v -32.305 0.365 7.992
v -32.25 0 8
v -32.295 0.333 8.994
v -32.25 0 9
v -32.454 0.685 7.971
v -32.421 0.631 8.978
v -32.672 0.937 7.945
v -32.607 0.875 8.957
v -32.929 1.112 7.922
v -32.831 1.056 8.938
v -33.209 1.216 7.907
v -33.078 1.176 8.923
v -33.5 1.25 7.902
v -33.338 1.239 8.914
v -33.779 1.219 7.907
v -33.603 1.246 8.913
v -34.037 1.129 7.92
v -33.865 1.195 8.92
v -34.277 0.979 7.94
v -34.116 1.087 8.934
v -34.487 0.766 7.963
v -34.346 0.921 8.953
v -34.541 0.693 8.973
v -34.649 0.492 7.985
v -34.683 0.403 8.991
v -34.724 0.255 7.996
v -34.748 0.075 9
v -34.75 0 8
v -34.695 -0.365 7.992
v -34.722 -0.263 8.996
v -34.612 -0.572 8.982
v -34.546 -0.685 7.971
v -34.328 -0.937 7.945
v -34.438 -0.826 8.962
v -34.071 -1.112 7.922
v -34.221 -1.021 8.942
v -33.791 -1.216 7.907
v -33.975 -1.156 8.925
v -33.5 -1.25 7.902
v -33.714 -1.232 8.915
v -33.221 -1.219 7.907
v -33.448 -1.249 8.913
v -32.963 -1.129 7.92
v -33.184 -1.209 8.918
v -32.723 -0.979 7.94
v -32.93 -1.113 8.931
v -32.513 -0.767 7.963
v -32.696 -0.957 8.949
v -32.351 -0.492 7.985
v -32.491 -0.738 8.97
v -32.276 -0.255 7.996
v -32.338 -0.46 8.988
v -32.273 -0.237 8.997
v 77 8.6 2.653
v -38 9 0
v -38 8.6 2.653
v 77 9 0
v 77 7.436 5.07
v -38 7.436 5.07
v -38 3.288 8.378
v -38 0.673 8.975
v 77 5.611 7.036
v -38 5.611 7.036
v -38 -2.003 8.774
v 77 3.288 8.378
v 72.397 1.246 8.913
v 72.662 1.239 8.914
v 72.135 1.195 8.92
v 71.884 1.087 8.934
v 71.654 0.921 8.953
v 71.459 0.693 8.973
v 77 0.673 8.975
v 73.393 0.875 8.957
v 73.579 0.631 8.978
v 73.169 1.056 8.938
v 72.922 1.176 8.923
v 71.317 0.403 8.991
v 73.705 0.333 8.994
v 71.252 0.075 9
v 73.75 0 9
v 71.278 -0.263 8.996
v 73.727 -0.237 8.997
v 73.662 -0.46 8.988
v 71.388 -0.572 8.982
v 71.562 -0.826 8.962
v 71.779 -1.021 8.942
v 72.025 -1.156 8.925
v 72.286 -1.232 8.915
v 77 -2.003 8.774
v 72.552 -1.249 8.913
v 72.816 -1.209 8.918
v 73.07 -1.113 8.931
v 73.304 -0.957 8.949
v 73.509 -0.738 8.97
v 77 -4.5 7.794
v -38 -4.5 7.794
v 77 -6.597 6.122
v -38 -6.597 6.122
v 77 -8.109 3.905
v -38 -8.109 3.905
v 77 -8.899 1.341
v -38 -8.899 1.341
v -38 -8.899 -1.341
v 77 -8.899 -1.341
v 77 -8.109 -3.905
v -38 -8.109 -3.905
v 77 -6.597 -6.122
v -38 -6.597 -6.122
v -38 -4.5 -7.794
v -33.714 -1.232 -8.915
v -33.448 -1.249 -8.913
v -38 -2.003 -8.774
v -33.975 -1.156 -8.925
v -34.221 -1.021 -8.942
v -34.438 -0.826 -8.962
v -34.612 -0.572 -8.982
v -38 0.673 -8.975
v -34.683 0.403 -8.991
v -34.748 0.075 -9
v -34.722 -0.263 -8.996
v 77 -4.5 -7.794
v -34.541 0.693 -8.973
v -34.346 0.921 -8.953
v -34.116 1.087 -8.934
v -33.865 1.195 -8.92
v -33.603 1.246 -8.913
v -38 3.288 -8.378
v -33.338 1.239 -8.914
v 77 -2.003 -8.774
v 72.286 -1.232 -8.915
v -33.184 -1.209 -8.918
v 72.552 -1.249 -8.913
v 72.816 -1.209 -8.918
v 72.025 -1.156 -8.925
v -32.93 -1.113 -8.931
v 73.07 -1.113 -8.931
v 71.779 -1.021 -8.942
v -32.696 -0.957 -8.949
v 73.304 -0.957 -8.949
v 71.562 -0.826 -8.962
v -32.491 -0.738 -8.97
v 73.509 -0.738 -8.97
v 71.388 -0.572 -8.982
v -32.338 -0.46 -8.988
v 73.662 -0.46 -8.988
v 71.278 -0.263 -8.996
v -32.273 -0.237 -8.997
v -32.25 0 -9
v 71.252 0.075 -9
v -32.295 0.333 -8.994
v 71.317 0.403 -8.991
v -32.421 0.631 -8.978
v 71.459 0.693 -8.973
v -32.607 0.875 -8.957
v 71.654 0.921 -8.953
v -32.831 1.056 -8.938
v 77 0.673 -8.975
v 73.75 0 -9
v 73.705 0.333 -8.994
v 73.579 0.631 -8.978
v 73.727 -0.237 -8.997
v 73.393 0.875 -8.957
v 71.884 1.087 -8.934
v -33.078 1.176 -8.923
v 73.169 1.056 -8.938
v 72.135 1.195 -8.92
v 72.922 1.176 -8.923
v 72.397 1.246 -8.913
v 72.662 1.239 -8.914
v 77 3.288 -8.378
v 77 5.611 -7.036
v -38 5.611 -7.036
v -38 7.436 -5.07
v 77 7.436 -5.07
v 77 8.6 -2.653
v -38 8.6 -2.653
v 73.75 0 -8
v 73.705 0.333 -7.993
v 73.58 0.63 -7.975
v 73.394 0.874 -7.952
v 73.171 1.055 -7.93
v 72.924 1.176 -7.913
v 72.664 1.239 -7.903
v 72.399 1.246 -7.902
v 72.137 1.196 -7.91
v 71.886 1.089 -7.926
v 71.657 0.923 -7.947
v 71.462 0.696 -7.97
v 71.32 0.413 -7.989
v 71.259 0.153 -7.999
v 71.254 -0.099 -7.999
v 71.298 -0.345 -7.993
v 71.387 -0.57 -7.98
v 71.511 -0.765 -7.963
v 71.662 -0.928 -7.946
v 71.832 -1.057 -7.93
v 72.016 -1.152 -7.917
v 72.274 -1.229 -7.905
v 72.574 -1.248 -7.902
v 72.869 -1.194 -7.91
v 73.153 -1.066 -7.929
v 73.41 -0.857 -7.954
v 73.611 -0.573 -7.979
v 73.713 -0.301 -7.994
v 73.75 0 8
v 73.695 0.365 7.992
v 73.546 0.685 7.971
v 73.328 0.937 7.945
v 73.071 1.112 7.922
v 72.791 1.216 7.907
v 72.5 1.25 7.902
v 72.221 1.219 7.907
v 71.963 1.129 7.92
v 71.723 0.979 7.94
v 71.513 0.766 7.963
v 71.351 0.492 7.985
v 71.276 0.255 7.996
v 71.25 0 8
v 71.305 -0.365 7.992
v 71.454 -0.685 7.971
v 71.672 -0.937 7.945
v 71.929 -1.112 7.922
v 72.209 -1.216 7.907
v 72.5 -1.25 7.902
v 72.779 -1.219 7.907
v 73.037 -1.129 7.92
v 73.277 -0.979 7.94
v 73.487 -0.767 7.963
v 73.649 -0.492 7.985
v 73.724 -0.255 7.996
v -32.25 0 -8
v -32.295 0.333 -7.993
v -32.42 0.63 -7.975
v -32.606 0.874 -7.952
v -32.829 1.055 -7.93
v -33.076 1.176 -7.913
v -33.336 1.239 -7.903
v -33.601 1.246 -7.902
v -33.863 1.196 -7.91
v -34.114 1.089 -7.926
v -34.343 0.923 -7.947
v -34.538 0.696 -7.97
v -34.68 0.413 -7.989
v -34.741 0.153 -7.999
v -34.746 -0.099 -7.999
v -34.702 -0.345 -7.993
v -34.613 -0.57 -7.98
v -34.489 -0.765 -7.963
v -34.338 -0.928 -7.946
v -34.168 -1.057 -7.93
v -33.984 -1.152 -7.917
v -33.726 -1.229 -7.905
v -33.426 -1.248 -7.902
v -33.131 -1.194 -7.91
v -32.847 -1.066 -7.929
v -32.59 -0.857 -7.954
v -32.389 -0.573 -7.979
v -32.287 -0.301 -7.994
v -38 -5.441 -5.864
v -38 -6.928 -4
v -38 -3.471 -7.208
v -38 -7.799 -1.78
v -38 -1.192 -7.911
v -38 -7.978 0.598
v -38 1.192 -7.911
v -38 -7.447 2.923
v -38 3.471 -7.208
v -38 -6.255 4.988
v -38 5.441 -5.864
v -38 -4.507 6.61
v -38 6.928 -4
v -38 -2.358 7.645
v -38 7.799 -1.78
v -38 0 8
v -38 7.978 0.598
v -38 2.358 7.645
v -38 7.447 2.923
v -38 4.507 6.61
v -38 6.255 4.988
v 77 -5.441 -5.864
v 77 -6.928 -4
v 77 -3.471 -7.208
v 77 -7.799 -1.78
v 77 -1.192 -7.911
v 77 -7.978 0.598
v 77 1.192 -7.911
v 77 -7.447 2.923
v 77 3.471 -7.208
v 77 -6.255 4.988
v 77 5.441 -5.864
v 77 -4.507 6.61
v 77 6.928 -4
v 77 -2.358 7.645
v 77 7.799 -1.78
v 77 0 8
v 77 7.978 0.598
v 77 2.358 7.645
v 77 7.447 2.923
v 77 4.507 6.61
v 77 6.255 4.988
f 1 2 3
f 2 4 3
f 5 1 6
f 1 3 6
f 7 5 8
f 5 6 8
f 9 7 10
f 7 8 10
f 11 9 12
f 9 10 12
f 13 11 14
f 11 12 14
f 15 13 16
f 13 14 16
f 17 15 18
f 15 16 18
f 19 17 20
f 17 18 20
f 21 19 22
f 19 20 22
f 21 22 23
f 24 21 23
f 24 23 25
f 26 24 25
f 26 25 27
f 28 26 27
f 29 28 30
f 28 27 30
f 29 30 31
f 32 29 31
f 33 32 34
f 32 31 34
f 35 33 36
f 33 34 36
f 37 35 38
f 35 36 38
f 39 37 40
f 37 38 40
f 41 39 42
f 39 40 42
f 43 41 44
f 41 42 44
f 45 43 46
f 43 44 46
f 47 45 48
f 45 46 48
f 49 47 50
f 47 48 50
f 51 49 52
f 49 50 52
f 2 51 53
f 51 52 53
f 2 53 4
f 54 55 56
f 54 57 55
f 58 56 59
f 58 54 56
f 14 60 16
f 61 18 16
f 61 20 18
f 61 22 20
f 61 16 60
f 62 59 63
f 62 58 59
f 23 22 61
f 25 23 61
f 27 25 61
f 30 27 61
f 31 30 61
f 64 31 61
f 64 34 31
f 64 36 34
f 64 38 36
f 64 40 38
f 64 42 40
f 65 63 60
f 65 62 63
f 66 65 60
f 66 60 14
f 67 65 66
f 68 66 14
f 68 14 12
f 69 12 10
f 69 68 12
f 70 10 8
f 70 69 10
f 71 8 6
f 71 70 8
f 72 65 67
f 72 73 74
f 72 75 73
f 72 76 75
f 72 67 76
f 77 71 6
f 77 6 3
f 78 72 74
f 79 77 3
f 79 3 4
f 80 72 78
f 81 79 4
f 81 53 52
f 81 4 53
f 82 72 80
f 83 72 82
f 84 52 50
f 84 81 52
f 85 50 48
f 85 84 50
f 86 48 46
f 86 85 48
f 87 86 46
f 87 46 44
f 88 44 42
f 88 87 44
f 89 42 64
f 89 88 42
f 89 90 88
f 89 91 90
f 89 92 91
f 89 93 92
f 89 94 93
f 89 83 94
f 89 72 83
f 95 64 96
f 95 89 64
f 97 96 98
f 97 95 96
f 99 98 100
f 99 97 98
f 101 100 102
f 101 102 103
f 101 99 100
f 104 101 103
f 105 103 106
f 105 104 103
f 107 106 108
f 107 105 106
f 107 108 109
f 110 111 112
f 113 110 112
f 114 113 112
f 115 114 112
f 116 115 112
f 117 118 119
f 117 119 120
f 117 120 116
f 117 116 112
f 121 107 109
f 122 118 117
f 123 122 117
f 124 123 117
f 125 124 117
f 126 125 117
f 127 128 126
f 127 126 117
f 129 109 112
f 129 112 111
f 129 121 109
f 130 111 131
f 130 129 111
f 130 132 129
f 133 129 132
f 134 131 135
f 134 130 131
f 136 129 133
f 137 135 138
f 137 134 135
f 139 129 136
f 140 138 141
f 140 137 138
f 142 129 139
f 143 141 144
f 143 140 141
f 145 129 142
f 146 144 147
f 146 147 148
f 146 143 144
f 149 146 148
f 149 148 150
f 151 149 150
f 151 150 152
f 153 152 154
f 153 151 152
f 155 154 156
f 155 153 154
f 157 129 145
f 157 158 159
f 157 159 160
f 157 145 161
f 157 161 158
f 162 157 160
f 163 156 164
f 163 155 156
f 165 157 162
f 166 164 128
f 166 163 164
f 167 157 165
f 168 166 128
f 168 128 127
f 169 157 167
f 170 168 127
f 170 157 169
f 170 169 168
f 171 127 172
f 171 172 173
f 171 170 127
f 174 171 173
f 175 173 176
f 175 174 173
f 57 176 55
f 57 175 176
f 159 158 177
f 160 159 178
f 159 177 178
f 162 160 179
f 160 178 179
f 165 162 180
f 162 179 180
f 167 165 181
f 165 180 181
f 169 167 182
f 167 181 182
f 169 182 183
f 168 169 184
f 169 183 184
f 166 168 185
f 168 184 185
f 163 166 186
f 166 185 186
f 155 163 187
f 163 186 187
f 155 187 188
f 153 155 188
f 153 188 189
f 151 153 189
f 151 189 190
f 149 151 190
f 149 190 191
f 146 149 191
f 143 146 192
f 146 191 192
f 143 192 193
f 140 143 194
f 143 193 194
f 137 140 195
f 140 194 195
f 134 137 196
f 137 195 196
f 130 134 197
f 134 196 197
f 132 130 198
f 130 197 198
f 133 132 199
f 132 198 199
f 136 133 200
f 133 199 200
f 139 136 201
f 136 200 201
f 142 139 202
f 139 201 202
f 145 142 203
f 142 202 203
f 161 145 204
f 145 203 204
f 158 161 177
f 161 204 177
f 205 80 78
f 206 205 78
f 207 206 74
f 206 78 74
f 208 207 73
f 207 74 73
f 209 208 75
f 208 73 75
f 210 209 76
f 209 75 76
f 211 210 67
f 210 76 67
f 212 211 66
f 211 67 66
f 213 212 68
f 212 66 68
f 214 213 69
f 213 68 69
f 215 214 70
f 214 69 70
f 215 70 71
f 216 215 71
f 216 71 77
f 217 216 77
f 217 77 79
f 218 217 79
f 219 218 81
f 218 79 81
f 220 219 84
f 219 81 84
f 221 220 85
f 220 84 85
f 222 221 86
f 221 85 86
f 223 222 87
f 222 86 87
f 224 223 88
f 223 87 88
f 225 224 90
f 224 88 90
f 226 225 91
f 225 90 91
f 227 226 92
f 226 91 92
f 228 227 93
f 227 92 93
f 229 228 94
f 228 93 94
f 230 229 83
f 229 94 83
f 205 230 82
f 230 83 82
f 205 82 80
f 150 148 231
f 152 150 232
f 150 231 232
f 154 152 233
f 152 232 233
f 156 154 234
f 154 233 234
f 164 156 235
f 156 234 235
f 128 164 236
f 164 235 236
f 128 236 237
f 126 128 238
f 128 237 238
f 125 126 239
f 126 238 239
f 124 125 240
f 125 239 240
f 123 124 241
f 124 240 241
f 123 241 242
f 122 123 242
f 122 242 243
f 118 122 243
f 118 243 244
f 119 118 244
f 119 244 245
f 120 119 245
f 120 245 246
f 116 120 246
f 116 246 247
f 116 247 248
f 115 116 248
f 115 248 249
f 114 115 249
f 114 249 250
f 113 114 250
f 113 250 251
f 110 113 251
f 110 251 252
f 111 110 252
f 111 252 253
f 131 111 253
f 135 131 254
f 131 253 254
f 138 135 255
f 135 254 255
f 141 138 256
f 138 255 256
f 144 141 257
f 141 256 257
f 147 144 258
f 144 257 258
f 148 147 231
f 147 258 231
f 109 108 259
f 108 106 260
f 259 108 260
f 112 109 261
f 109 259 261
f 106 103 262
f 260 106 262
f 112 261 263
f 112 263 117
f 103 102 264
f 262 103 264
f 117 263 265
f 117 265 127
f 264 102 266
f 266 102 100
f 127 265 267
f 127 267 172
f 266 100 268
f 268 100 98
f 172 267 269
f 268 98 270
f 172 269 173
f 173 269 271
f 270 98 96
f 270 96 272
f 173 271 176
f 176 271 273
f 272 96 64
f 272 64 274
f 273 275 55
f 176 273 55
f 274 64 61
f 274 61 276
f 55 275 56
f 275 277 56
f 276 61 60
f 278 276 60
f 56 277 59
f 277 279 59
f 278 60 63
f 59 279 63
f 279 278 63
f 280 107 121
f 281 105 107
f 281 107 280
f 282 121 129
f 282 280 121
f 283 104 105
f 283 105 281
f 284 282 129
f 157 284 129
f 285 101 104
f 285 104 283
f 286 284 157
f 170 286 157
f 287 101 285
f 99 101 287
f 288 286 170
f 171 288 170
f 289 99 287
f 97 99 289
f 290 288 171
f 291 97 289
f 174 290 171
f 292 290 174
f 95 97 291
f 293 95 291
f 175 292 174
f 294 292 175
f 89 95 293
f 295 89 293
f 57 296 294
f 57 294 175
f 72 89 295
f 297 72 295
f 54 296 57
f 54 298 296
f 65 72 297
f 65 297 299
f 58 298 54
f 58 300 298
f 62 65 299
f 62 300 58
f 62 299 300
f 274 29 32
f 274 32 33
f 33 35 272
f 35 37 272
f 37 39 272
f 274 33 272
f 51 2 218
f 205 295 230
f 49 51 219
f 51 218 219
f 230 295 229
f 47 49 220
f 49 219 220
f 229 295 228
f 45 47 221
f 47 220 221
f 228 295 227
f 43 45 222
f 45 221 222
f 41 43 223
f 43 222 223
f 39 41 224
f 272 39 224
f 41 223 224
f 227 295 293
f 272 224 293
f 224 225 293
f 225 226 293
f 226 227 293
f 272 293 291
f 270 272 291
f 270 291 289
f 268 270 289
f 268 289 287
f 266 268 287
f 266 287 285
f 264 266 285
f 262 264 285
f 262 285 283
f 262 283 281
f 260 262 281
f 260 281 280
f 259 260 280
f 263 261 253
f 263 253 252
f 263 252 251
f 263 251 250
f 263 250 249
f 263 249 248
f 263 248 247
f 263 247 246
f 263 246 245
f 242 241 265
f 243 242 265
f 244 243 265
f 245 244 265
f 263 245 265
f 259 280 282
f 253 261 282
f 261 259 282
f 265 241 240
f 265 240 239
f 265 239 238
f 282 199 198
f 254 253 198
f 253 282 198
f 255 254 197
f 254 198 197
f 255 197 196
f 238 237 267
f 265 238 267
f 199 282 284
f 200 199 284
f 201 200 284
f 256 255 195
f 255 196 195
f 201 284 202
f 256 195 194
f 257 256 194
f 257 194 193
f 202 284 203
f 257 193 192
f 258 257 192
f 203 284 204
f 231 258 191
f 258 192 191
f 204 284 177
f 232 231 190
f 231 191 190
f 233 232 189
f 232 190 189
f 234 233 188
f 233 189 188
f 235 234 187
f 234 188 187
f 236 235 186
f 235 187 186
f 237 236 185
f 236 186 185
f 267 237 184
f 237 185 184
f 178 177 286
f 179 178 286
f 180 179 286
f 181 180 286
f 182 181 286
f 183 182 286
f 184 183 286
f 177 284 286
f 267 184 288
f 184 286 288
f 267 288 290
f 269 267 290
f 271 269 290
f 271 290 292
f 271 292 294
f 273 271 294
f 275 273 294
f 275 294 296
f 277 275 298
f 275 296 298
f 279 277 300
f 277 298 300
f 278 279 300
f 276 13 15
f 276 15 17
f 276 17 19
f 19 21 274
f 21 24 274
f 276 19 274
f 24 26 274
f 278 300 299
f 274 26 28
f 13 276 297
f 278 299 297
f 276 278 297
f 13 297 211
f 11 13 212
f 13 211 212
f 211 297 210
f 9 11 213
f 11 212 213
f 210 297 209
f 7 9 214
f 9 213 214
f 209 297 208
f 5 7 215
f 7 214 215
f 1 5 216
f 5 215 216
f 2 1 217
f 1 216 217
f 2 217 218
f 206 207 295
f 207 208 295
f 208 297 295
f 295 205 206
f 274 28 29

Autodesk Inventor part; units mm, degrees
ref_plane "YZ Plane" through (0, 0, 0) normal (1, 0, 0) x (0, 1, 0)
ref_plane "XZ Plane" through (0, 0, 0) normal (0, 1, 0) x (-1, 0, 0)
sketch "ShaftProfile" plane through (0, 0, 0) normal (0, 0, 1) x (1, 0, 0)
  line L0 (-61, 0) -> (100, 0) construction
  line L1 (-38, 9) -> (77, 9)
  line L2 (77, 9) -> (77, 0)
  line L3 (-38, 0) -> (-38, 9)
  line L4 (-38, 0) -> (77, 0)
  point P0 (0, 0)
  dimension "d1" = 115
  dimension "d2" = 9
  dimension "d4" = 38
revolve "ShaftFeature" add sketch "ShaftProfile" angle 360 about axis through (-38, 0, 0) along (1, 0, 0)
sketch "Sketch2" plane through (-38, 0, 0) normal (-1, 0, 0) x (0, 0, 1)
  circle A0 centre (0, 0) radius 9 projected
hole "ShaftHoleFeature" at (-38, 0, 0) direction (1, 0, 0) diameter 16 end through all
ref_plane "MidSidePlane" through (0, 0, 10) normal (0, 0, 1) x (1, 0, 0)
sketch "CapHoles" plane through (0, 0, 10) normal (0, 0, 1) x (1, 0, 0)
  line L0 (77, -9) -> (77, 9) construction
  line L1 (-38, -9) -> (-38, 9) construction
  line L2 (-56, 0) -> (70, 0) construction
  circle A0 centre (-33.5, 0) radius 1.25
  circle A1 centre (72.5, 0) radius 1.25
  dimension "d24" = 2.5
  dimension "d25" = 4.5
  dimension "d26" = 4.5
extrude "CapHolesFeature" cut sketch "CapHoles" against normal through all
equation "\"d26\" = d25"
properties part number "BackPair1PistonShaft"
